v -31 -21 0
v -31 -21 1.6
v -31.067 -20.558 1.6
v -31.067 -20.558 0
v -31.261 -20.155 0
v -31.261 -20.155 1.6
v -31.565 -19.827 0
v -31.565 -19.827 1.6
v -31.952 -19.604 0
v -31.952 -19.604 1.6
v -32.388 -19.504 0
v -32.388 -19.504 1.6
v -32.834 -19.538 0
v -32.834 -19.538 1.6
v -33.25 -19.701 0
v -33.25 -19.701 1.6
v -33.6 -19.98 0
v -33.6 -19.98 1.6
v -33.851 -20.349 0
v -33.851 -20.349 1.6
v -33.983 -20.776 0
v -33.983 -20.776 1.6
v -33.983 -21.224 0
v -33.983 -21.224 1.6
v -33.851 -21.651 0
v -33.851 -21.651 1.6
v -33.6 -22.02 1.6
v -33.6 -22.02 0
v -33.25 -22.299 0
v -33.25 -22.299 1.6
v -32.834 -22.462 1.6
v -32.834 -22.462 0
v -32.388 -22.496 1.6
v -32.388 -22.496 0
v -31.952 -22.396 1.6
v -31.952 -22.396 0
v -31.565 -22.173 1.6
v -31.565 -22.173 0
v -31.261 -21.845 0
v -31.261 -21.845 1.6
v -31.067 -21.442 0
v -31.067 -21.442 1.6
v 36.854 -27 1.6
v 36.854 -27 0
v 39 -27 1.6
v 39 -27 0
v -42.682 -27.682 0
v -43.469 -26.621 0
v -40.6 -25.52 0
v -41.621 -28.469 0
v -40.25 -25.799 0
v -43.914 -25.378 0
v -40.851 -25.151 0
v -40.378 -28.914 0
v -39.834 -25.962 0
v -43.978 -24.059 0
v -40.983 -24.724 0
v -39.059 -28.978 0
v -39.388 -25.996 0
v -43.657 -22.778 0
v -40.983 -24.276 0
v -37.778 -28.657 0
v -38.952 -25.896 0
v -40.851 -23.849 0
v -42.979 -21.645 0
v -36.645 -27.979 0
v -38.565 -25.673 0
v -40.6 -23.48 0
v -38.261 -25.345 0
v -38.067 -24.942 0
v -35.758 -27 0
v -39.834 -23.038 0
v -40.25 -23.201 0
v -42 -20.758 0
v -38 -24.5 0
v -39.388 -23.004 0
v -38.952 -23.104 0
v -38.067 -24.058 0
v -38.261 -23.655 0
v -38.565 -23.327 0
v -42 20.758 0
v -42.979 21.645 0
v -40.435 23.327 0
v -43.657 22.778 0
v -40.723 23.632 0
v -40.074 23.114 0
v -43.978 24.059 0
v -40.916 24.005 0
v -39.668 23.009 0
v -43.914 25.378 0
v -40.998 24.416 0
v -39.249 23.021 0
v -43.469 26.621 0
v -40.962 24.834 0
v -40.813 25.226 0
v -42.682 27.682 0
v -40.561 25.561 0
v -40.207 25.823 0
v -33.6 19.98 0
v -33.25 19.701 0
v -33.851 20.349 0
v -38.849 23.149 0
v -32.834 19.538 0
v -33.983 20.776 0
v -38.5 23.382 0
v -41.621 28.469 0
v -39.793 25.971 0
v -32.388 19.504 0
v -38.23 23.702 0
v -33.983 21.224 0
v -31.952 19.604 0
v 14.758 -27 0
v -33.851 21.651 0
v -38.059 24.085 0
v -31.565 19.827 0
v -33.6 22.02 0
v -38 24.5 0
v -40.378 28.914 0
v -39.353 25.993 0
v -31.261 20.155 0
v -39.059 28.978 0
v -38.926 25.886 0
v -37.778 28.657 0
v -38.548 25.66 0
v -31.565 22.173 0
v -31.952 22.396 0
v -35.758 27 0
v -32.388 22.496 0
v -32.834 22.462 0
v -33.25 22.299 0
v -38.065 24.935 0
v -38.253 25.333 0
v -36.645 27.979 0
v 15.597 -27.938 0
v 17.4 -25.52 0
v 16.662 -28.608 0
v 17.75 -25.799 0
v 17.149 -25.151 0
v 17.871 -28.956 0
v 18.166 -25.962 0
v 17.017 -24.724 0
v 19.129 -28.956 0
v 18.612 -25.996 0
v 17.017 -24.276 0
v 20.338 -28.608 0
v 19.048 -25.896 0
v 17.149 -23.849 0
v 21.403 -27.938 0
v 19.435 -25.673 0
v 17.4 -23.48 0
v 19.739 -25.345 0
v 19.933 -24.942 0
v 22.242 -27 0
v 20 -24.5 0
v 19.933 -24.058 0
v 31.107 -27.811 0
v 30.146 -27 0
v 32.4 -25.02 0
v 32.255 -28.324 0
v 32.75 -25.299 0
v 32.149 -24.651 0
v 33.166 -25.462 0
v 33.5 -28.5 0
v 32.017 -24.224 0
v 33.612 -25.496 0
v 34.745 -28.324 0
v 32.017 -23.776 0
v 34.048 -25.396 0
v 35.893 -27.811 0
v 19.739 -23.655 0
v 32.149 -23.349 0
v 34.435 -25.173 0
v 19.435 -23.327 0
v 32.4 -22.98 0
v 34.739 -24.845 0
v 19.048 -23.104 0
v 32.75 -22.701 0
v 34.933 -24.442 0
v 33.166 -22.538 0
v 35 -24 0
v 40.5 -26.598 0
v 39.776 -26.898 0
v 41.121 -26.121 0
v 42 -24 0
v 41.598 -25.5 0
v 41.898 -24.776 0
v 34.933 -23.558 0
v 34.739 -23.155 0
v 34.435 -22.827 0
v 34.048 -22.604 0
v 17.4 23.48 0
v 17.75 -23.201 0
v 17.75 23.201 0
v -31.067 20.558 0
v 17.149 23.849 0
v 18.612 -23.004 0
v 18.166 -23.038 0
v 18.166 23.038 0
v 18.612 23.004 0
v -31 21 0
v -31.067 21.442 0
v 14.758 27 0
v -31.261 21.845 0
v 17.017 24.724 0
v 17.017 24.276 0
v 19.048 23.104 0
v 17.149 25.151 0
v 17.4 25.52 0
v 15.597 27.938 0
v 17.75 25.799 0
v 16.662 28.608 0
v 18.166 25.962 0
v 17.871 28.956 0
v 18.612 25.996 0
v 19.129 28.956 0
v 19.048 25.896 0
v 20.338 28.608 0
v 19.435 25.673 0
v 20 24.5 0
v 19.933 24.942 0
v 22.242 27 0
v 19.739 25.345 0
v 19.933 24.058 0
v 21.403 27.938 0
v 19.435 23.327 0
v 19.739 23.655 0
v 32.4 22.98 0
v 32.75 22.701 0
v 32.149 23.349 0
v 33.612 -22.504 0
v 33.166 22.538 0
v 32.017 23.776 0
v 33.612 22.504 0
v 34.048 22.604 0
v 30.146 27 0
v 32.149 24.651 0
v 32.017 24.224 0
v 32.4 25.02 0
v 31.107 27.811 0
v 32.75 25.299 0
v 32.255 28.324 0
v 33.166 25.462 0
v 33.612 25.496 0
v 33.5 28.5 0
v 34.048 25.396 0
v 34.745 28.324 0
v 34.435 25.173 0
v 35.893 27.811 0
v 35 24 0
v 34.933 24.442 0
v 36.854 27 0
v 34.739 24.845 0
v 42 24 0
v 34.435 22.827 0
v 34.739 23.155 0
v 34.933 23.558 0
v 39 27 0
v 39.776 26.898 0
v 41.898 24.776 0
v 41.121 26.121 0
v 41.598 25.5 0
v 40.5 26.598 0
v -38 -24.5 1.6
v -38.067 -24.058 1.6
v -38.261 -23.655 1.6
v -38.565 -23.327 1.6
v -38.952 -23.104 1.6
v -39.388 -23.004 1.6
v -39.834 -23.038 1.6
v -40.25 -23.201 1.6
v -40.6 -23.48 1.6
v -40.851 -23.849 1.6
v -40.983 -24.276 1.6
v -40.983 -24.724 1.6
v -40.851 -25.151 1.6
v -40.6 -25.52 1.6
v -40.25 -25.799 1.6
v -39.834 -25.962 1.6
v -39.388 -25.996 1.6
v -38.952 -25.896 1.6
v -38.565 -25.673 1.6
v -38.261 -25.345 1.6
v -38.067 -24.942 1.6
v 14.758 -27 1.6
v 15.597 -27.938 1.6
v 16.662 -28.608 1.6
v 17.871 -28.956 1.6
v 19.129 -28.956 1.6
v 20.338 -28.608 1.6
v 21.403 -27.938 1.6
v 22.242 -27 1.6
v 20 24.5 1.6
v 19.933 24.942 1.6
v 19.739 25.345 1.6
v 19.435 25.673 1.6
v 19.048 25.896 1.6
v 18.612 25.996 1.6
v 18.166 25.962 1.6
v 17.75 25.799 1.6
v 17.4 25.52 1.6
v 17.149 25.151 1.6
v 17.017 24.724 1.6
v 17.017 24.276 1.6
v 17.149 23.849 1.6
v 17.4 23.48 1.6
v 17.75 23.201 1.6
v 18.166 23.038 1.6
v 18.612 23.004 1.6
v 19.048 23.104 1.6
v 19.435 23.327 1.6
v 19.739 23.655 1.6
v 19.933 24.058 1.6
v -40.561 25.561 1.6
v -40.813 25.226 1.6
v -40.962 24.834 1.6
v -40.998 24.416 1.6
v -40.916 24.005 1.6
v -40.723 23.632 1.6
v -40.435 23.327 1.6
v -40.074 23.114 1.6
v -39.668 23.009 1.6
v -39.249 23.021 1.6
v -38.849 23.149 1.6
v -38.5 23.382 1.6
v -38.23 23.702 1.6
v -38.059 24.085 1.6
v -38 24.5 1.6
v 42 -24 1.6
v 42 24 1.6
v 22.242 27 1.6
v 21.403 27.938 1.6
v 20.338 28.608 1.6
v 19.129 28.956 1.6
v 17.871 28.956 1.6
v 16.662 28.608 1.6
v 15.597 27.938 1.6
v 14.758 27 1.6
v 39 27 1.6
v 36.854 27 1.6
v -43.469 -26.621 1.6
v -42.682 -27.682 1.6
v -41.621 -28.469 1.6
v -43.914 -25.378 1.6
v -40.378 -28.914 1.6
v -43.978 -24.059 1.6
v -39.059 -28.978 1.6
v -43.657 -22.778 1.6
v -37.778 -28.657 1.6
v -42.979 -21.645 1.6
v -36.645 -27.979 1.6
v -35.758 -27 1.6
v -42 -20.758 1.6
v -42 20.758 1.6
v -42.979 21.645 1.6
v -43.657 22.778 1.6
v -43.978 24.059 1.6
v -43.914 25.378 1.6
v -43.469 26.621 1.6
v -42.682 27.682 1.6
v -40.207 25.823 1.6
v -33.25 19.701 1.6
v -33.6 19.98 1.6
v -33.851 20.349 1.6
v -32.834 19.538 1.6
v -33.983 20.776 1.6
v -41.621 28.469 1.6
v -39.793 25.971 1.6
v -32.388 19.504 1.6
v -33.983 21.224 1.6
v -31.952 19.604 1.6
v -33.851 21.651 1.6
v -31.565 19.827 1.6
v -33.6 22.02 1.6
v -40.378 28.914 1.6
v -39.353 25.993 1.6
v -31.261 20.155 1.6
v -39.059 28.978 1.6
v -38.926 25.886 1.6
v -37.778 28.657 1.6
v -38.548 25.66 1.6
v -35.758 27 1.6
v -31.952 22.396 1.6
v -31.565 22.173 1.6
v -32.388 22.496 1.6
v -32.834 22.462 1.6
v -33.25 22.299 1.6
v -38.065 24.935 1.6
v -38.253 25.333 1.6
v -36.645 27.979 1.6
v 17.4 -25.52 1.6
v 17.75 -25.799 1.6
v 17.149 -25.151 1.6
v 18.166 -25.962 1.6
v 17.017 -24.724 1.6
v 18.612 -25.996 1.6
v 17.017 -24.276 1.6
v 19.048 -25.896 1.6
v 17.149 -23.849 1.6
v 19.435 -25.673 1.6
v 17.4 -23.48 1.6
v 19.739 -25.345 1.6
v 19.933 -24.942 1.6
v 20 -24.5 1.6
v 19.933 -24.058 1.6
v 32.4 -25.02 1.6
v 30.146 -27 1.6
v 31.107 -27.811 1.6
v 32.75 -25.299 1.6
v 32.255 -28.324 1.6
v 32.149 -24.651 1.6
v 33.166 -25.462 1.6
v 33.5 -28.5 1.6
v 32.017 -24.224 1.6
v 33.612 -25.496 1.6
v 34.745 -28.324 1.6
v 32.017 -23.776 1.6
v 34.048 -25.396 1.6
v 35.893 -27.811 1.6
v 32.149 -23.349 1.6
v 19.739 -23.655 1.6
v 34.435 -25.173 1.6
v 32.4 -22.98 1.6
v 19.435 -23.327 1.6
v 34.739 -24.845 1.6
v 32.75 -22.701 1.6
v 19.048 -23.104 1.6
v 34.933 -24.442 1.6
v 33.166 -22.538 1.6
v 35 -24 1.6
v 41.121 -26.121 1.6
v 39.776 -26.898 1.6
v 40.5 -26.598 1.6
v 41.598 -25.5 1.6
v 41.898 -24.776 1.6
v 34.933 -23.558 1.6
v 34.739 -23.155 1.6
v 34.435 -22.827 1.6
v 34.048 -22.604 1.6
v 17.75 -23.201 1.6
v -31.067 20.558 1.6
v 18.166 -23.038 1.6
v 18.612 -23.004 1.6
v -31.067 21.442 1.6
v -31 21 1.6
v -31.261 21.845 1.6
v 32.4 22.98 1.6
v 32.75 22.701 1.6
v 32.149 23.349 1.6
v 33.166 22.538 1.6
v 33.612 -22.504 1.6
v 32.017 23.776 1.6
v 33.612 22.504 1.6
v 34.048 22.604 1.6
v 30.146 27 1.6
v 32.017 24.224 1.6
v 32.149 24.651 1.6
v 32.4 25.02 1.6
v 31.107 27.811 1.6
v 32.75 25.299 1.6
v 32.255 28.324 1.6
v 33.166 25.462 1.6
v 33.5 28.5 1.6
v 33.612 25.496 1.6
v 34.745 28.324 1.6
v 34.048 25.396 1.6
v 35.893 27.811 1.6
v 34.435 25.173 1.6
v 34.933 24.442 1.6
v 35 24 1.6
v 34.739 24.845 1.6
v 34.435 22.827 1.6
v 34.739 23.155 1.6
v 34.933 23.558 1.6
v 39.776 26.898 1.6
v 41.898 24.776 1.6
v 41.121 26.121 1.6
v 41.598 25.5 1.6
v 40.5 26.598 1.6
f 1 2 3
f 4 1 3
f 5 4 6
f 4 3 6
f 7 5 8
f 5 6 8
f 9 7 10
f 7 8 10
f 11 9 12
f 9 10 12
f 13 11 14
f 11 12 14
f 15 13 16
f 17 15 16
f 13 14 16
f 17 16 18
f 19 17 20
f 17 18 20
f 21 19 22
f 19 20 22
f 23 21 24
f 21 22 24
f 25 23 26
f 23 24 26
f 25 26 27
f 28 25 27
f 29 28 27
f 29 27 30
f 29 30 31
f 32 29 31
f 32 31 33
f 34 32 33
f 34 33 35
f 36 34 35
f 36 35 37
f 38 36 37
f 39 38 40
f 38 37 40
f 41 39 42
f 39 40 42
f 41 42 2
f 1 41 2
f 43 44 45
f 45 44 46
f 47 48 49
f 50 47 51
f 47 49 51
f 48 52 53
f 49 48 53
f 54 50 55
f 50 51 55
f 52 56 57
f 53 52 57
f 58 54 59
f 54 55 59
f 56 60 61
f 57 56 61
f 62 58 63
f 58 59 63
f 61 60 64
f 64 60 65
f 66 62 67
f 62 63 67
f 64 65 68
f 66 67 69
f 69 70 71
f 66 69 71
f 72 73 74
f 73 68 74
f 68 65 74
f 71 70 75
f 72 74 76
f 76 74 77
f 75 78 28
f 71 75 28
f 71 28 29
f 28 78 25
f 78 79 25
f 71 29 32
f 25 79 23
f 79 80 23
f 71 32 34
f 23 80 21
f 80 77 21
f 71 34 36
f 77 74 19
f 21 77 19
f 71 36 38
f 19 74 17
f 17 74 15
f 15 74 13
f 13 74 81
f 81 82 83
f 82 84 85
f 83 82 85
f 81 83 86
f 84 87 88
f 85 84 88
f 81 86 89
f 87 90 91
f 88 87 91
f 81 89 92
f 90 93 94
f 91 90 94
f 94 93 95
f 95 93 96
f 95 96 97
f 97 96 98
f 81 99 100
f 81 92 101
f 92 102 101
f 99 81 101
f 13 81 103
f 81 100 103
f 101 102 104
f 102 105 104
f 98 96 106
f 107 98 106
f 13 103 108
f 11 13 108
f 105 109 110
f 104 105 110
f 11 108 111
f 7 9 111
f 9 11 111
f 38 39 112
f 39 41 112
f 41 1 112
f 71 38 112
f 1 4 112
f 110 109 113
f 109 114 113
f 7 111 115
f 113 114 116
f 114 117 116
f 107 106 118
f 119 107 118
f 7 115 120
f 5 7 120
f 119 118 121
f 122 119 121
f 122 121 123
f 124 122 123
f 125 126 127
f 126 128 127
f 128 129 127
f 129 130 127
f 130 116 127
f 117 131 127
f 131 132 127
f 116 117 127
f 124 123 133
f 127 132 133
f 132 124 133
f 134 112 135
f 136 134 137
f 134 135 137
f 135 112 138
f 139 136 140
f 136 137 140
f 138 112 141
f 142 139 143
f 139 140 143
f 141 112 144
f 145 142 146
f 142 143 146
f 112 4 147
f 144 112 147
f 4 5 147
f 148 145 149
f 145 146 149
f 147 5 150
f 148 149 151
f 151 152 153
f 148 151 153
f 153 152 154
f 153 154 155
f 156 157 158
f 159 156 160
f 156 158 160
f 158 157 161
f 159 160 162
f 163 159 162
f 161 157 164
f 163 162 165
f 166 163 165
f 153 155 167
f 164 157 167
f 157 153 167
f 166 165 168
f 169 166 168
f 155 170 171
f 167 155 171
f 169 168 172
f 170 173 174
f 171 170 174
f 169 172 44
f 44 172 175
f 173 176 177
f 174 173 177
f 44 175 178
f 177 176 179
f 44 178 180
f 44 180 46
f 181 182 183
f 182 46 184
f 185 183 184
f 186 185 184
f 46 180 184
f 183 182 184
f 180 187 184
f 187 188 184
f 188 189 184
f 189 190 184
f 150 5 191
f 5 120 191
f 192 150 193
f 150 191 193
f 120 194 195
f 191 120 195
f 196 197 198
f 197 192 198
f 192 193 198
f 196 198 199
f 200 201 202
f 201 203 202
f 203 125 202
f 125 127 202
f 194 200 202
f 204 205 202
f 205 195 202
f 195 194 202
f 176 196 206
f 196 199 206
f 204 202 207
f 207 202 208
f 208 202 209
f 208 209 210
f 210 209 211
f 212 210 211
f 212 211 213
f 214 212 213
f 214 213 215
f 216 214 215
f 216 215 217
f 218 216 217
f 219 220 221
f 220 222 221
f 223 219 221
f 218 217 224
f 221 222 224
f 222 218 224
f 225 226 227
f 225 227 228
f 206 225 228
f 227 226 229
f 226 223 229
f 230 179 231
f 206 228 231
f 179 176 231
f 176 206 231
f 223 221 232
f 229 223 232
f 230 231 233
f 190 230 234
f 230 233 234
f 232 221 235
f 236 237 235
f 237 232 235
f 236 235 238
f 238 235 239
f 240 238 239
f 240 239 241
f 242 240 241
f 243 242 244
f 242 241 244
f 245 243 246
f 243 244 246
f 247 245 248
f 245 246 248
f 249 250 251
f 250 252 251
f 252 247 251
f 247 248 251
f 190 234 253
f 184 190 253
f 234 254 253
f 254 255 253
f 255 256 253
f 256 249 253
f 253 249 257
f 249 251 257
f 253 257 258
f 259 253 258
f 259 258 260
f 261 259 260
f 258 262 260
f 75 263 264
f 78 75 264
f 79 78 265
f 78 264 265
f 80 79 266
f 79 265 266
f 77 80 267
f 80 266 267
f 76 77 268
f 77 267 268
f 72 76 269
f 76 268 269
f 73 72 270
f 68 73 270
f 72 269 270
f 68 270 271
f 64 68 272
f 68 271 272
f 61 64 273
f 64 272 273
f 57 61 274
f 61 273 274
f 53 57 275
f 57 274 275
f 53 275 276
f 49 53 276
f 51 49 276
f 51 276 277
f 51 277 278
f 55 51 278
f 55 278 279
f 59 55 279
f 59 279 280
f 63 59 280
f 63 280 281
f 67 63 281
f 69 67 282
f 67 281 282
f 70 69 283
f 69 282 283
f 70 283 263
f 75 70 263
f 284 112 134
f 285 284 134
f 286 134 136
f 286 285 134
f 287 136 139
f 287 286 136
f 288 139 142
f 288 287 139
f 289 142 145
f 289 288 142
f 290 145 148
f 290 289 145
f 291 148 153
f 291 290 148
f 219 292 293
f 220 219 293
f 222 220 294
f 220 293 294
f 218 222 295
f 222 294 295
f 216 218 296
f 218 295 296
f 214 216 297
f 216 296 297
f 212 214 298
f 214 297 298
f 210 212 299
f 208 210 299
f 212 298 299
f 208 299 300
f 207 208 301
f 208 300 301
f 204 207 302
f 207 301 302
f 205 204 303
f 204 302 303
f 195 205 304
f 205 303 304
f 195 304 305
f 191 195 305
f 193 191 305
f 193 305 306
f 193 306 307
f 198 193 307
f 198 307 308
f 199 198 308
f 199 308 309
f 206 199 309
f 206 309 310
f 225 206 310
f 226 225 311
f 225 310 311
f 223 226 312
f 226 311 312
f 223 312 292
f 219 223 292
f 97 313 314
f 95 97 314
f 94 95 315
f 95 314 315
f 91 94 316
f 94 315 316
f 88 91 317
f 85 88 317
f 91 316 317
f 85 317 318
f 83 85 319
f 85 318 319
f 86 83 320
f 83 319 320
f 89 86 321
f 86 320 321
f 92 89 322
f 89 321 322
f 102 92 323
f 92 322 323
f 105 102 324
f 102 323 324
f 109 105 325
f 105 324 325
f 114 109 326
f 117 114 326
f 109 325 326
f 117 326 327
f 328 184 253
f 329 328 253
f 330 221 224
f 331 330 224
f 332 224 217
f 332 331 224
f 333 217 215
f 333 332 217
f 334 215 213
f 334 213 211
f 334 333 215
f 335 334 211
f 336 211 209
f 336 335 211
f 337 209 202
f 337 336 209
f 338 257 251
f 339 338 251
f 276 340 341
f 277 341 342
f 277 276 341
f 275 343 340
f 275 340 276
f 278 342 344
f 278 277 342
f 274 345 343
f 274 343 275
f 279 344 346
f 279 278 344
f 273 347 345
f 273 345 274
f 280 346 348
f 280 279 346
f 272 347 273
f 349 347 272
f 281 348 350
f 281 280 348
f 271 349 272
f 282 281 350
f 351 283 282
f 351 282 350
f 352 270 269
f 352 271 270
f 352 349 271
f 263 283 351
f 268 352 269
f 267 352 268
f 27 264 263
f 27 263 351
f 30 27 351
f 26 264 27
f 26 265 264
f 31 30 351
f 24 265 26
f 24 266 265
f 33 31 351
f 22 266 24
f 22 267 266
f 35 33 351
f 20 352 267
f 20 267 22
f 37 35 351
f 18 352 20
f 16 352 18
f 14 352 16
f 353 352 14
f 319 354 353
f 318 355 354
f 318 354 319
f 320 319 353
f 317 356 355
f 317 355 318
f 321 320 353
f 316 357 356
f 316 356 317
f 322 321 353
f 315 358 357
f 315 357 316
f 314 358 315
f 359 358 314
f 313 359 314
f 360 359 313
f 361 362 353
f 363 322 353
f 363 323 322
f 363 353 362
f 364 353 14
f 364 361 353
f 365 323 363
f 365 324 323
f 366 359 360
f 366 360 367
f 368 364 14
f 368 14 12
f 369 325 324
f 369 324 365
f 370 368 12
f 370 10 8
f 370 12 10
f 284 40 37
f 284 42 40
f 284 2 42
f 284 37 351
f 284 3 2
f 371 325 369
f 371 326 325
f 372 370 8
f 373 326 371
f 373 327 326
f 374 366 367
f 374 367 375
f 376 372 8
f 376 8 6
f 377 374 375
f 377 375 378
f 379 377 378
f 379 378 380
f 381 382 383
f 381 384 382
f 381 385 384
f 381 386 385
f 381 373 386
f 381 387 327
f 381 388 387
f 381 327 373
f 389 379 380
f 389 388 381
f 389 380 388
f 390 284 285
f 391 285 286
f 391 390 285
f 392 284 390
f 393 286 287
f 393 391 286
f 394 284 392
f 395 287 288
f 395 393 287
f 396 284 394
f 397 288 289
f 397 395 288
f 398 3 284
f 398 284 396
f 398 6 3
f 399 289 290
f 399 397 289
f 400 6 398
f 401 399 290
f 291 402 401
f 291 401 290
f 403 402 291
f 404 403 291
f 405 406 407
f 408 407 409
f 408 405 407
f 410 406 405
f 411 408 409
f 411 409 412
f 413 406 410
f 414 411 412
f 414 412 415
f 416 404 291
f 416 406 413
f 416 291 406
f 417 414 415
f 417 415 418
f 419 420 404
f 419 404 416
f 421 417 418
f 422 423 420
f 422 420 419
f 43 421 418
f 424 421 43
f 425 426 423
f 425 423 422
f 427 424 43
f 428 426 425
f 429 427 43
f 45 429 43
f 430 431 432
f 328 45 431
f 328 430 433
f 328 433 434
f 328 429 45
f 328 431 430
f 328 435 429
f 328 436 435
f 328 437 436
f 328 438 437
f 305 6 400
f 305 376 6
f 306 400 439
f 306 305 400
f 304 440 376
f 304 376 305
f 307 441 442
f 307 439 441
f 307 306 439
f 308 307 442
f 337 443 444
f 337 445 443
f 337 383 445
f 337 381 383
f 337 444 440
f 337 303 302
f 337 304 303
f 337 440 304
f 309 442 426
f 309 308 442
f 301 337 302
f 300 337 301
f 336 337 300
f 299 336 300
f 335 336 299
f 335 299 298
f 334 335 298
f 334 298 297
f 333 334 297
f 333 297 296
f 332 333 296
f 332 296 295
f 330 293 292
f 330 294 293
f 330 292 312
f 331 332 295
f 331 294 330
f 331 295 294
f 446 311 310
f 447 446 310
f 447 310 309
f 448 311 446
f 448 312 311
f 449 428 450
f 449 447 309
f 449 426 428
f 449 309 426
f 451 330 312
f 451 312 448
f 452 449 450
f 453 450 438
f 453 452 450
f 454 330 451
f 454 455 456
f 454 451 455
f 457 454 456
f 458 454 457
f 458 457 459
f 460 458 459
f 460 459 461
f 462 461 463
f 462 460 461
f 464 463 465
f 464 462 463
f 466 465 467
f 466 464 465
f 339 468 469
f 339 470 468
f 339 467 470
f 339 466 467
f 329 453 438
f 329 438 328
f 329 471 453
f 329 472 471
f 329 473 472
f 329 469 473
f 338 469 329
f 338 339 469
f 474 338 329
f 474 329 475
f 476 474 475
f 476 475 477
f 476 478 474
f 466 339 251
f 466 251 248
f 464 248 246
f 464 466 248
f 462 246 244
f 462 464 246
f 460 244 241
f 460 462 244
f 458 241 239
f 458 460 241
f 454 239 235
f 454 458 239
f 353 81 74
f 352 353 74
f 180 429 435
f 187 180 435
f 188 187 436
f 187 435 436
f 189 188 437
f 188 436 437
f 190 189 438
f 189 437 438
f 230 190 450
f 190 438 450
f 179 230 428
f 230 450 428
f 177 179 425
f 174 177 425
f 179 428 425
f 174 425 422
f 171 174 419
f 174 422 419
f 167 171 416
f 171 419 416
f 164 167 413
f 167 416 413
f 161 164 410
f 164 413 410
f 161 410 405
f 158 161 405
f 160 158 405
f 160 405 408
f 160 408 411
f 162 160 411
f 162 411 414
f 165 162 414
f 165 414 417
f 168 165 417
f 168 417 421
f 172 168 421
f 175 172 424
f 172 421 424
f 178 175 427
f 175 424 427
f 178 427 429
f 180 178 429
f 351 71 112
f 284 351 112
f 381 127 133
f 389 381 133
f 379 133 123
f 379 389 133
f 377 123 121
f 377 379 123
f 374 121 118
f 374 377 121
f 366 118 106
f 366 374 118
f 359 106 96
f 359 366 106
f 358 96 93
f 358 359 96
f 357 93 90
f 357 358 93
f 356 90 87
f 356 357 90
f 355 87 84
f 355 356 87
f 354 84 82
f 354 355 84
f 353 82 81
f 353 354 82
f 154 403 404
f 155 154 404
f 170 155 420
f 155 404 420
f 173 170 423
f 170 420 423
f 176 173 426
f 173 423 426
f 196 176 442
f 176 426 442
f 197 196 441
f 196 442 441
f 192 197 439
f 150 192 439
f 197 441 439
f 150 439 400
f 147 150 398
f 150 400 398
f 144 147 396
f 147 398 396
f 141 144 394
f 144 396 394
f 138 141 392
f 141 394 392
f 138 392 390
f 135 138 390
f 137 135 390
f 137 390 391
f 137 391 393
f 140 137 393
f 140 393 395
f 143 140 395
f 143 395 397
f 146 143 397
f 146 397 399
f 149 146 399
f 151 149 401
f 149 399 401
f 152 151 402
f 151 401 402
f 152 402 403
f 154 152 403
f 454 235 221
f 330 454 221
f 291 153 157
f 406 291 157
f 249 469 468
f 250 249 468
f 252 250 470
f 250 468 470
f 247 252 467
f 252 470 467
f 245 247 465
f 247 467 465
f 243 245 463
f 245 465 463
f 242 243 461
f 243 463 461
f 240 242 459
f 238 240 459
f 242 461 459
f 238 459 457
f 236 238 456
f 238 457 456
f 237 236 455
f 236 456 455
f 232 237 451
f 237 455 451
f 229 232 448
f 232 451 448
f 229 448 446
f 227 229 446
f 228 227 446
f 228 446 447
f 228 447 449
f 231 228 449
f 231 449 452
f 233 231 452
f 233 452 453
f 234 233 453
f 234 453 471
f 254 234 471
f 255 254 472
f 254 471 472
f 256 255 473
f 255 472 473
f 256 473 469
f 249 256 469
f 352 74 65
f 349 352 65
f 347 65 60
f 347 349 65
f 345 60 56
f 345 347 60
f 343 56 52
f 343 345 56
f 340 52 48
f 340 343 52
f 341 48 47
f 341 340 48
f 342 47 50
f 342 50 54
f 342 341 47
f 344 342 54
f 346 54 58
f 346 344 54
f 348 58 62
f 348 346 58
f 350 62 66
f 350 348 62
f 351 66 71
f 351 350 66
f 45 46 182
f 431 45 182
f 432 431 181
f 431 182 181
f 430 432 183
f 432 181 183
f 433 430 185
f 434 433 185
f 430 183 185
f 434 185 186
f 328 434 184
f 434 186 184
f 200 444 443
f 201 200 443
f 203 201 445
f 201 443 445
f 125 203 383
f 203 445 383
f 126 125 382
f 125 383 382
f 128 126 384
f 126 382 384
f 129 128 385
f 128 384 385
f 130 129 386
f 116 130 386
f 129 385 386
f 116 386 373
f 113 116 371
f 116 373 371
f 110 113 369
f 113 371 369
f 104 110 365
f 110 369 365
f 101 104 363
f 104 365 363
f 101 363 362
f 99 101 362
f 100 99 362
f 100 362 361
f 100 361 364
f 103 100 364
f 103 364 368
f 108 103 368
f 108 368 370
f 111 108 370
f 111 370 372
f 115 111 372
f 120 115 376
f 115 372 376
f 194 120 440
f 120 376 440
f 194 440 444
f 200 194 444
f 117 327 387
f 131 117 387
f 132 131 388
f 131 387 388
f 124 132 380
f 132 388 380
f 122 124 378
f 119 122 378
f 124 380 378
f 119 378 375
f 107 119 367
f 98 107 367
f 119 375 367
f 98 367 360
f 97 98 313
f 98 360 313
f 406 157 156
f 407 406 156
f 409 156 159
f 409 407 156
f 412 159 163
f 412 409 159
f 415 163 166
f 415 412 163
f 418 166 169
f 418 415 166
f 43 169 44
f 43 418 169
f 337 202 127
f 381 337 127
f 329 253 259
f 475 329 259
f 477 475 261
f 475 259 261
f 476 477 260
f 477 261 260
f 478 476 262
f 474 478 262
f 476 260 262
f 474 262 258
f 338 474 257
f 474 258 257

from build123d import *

# Parameters (mm, degrees)
F1_DEPTH = 1.6
F2_R     = 1.5
F3_DEPTH = 1.6
F4_R     = 1.5
F5_DEPTH = 1.6
F6_R     = 4.5
F6_R_2   = 1.5
F7_DEPTH = 1.6


with BuildPart() as f1:
    # F0 (on Top) → F1 (new body)
    with BuildSketch(Plane.XY):
        with BuildLine():
            Line((-39, -27), (39, -27))
            ThreePointArc((39, -27), (41.12132, -26.12132), (42, -24))
            Line((42, -24), (42, 24))
            ThreePointArc((42, 24), (41.12132, 26.12132), (39, 27))
            Line((39, 27), (-39, 27))
            ThreePointArc((-39, 27), (-41.12132, 26.12132), (-42, 24))
            Line((-42, 24), (-42, -24))
            ThreePointArc((-42, -24), (-41.12132, -26.12132), (-39, -27))
        make_face()
    extrude(amount=F1_DEPTH)

    # F2 (on face) → F3 (cut, through all)
    with BuildSketch(Plane.XY.offset(1.6)):
        with BuildLine():
            ThreePointArc((-40.56066, 25.56066), (-40.074025, 23.114181), (-38, 24.5))
            ThreePointArc((-38, 24.5), (-38.925975, 25.885819), (-40.56066, 25.56066))
        make_face()
        with Locations((18.5, 24.5)):
            Circle(F2_R)
        with Locations((18.5, -24.5)):
            Circle(F2_R)
        with Locations((-39.5, -24.5)):
            Circle(F2_R)
    extrude(amount=-F3_DEPTH, mode=Mode.SUBTRACT)

    # F4 (on face) → F5 (cut, through all)
    with BuildSketch(Plane.XY.offset(1.6)):
        with Locations((33.5, 24)):
            Circle(F4_R)
        with Locations((33.5, -24)):
            Circle(F4_R)
        with Locations((-32.5, 21)):
            Circle(F4_R)
        with Locations((-32.5, -21)):
            Circle(F4_R)
    extrude(amount=-F5_DEPTH, mode=Mode.SUBTRACT)

    # F6 (on face) → F7 (join)
    with BuildSketch(Plane.XY.offset(1.6)):
        with Locations((-39.5, 24.5)):
            Circle(F6_R)
        with Locations((-39.5, 24.5)):
            Circle(F6_R_2, mode=Mode.SUBTRACT)
        with Locations((-39.5, -24.5)):
            Circle(F6_R)
        with Locations((-39.5, -24.5)):
            Circle(F6_R_2, mode=Mode.SUBTRACT)
        with Locations((18.5, 24.5)):
            Circle(F6_R)
        with Locations((18.5, 24.5)):
            Circle(F6_R_2, mode=Mode.SUBTRACT)
        with Locations((18.5, -24.5)):
            Circle(F6_R)
        with Locations((18.5, -24.5)):
            Circle(F6_R_2, mode=Mode.SUBTRACT)
        with Locations((33.5, -24)):
            Circle(F6_R)
        with Locations((33.5, -24)):
            Circle(F6_R_2, mode=Mode.SUBTRACT)
        with Locations((33.5, 24)):
            Circle(F6_R)
        with Locations((33.5, 24)):
            Circle(F6_R_2, mode=Mode.SUBTRACT)
    extrude(amount=-F7_DEPTH)


solid = f1.part
